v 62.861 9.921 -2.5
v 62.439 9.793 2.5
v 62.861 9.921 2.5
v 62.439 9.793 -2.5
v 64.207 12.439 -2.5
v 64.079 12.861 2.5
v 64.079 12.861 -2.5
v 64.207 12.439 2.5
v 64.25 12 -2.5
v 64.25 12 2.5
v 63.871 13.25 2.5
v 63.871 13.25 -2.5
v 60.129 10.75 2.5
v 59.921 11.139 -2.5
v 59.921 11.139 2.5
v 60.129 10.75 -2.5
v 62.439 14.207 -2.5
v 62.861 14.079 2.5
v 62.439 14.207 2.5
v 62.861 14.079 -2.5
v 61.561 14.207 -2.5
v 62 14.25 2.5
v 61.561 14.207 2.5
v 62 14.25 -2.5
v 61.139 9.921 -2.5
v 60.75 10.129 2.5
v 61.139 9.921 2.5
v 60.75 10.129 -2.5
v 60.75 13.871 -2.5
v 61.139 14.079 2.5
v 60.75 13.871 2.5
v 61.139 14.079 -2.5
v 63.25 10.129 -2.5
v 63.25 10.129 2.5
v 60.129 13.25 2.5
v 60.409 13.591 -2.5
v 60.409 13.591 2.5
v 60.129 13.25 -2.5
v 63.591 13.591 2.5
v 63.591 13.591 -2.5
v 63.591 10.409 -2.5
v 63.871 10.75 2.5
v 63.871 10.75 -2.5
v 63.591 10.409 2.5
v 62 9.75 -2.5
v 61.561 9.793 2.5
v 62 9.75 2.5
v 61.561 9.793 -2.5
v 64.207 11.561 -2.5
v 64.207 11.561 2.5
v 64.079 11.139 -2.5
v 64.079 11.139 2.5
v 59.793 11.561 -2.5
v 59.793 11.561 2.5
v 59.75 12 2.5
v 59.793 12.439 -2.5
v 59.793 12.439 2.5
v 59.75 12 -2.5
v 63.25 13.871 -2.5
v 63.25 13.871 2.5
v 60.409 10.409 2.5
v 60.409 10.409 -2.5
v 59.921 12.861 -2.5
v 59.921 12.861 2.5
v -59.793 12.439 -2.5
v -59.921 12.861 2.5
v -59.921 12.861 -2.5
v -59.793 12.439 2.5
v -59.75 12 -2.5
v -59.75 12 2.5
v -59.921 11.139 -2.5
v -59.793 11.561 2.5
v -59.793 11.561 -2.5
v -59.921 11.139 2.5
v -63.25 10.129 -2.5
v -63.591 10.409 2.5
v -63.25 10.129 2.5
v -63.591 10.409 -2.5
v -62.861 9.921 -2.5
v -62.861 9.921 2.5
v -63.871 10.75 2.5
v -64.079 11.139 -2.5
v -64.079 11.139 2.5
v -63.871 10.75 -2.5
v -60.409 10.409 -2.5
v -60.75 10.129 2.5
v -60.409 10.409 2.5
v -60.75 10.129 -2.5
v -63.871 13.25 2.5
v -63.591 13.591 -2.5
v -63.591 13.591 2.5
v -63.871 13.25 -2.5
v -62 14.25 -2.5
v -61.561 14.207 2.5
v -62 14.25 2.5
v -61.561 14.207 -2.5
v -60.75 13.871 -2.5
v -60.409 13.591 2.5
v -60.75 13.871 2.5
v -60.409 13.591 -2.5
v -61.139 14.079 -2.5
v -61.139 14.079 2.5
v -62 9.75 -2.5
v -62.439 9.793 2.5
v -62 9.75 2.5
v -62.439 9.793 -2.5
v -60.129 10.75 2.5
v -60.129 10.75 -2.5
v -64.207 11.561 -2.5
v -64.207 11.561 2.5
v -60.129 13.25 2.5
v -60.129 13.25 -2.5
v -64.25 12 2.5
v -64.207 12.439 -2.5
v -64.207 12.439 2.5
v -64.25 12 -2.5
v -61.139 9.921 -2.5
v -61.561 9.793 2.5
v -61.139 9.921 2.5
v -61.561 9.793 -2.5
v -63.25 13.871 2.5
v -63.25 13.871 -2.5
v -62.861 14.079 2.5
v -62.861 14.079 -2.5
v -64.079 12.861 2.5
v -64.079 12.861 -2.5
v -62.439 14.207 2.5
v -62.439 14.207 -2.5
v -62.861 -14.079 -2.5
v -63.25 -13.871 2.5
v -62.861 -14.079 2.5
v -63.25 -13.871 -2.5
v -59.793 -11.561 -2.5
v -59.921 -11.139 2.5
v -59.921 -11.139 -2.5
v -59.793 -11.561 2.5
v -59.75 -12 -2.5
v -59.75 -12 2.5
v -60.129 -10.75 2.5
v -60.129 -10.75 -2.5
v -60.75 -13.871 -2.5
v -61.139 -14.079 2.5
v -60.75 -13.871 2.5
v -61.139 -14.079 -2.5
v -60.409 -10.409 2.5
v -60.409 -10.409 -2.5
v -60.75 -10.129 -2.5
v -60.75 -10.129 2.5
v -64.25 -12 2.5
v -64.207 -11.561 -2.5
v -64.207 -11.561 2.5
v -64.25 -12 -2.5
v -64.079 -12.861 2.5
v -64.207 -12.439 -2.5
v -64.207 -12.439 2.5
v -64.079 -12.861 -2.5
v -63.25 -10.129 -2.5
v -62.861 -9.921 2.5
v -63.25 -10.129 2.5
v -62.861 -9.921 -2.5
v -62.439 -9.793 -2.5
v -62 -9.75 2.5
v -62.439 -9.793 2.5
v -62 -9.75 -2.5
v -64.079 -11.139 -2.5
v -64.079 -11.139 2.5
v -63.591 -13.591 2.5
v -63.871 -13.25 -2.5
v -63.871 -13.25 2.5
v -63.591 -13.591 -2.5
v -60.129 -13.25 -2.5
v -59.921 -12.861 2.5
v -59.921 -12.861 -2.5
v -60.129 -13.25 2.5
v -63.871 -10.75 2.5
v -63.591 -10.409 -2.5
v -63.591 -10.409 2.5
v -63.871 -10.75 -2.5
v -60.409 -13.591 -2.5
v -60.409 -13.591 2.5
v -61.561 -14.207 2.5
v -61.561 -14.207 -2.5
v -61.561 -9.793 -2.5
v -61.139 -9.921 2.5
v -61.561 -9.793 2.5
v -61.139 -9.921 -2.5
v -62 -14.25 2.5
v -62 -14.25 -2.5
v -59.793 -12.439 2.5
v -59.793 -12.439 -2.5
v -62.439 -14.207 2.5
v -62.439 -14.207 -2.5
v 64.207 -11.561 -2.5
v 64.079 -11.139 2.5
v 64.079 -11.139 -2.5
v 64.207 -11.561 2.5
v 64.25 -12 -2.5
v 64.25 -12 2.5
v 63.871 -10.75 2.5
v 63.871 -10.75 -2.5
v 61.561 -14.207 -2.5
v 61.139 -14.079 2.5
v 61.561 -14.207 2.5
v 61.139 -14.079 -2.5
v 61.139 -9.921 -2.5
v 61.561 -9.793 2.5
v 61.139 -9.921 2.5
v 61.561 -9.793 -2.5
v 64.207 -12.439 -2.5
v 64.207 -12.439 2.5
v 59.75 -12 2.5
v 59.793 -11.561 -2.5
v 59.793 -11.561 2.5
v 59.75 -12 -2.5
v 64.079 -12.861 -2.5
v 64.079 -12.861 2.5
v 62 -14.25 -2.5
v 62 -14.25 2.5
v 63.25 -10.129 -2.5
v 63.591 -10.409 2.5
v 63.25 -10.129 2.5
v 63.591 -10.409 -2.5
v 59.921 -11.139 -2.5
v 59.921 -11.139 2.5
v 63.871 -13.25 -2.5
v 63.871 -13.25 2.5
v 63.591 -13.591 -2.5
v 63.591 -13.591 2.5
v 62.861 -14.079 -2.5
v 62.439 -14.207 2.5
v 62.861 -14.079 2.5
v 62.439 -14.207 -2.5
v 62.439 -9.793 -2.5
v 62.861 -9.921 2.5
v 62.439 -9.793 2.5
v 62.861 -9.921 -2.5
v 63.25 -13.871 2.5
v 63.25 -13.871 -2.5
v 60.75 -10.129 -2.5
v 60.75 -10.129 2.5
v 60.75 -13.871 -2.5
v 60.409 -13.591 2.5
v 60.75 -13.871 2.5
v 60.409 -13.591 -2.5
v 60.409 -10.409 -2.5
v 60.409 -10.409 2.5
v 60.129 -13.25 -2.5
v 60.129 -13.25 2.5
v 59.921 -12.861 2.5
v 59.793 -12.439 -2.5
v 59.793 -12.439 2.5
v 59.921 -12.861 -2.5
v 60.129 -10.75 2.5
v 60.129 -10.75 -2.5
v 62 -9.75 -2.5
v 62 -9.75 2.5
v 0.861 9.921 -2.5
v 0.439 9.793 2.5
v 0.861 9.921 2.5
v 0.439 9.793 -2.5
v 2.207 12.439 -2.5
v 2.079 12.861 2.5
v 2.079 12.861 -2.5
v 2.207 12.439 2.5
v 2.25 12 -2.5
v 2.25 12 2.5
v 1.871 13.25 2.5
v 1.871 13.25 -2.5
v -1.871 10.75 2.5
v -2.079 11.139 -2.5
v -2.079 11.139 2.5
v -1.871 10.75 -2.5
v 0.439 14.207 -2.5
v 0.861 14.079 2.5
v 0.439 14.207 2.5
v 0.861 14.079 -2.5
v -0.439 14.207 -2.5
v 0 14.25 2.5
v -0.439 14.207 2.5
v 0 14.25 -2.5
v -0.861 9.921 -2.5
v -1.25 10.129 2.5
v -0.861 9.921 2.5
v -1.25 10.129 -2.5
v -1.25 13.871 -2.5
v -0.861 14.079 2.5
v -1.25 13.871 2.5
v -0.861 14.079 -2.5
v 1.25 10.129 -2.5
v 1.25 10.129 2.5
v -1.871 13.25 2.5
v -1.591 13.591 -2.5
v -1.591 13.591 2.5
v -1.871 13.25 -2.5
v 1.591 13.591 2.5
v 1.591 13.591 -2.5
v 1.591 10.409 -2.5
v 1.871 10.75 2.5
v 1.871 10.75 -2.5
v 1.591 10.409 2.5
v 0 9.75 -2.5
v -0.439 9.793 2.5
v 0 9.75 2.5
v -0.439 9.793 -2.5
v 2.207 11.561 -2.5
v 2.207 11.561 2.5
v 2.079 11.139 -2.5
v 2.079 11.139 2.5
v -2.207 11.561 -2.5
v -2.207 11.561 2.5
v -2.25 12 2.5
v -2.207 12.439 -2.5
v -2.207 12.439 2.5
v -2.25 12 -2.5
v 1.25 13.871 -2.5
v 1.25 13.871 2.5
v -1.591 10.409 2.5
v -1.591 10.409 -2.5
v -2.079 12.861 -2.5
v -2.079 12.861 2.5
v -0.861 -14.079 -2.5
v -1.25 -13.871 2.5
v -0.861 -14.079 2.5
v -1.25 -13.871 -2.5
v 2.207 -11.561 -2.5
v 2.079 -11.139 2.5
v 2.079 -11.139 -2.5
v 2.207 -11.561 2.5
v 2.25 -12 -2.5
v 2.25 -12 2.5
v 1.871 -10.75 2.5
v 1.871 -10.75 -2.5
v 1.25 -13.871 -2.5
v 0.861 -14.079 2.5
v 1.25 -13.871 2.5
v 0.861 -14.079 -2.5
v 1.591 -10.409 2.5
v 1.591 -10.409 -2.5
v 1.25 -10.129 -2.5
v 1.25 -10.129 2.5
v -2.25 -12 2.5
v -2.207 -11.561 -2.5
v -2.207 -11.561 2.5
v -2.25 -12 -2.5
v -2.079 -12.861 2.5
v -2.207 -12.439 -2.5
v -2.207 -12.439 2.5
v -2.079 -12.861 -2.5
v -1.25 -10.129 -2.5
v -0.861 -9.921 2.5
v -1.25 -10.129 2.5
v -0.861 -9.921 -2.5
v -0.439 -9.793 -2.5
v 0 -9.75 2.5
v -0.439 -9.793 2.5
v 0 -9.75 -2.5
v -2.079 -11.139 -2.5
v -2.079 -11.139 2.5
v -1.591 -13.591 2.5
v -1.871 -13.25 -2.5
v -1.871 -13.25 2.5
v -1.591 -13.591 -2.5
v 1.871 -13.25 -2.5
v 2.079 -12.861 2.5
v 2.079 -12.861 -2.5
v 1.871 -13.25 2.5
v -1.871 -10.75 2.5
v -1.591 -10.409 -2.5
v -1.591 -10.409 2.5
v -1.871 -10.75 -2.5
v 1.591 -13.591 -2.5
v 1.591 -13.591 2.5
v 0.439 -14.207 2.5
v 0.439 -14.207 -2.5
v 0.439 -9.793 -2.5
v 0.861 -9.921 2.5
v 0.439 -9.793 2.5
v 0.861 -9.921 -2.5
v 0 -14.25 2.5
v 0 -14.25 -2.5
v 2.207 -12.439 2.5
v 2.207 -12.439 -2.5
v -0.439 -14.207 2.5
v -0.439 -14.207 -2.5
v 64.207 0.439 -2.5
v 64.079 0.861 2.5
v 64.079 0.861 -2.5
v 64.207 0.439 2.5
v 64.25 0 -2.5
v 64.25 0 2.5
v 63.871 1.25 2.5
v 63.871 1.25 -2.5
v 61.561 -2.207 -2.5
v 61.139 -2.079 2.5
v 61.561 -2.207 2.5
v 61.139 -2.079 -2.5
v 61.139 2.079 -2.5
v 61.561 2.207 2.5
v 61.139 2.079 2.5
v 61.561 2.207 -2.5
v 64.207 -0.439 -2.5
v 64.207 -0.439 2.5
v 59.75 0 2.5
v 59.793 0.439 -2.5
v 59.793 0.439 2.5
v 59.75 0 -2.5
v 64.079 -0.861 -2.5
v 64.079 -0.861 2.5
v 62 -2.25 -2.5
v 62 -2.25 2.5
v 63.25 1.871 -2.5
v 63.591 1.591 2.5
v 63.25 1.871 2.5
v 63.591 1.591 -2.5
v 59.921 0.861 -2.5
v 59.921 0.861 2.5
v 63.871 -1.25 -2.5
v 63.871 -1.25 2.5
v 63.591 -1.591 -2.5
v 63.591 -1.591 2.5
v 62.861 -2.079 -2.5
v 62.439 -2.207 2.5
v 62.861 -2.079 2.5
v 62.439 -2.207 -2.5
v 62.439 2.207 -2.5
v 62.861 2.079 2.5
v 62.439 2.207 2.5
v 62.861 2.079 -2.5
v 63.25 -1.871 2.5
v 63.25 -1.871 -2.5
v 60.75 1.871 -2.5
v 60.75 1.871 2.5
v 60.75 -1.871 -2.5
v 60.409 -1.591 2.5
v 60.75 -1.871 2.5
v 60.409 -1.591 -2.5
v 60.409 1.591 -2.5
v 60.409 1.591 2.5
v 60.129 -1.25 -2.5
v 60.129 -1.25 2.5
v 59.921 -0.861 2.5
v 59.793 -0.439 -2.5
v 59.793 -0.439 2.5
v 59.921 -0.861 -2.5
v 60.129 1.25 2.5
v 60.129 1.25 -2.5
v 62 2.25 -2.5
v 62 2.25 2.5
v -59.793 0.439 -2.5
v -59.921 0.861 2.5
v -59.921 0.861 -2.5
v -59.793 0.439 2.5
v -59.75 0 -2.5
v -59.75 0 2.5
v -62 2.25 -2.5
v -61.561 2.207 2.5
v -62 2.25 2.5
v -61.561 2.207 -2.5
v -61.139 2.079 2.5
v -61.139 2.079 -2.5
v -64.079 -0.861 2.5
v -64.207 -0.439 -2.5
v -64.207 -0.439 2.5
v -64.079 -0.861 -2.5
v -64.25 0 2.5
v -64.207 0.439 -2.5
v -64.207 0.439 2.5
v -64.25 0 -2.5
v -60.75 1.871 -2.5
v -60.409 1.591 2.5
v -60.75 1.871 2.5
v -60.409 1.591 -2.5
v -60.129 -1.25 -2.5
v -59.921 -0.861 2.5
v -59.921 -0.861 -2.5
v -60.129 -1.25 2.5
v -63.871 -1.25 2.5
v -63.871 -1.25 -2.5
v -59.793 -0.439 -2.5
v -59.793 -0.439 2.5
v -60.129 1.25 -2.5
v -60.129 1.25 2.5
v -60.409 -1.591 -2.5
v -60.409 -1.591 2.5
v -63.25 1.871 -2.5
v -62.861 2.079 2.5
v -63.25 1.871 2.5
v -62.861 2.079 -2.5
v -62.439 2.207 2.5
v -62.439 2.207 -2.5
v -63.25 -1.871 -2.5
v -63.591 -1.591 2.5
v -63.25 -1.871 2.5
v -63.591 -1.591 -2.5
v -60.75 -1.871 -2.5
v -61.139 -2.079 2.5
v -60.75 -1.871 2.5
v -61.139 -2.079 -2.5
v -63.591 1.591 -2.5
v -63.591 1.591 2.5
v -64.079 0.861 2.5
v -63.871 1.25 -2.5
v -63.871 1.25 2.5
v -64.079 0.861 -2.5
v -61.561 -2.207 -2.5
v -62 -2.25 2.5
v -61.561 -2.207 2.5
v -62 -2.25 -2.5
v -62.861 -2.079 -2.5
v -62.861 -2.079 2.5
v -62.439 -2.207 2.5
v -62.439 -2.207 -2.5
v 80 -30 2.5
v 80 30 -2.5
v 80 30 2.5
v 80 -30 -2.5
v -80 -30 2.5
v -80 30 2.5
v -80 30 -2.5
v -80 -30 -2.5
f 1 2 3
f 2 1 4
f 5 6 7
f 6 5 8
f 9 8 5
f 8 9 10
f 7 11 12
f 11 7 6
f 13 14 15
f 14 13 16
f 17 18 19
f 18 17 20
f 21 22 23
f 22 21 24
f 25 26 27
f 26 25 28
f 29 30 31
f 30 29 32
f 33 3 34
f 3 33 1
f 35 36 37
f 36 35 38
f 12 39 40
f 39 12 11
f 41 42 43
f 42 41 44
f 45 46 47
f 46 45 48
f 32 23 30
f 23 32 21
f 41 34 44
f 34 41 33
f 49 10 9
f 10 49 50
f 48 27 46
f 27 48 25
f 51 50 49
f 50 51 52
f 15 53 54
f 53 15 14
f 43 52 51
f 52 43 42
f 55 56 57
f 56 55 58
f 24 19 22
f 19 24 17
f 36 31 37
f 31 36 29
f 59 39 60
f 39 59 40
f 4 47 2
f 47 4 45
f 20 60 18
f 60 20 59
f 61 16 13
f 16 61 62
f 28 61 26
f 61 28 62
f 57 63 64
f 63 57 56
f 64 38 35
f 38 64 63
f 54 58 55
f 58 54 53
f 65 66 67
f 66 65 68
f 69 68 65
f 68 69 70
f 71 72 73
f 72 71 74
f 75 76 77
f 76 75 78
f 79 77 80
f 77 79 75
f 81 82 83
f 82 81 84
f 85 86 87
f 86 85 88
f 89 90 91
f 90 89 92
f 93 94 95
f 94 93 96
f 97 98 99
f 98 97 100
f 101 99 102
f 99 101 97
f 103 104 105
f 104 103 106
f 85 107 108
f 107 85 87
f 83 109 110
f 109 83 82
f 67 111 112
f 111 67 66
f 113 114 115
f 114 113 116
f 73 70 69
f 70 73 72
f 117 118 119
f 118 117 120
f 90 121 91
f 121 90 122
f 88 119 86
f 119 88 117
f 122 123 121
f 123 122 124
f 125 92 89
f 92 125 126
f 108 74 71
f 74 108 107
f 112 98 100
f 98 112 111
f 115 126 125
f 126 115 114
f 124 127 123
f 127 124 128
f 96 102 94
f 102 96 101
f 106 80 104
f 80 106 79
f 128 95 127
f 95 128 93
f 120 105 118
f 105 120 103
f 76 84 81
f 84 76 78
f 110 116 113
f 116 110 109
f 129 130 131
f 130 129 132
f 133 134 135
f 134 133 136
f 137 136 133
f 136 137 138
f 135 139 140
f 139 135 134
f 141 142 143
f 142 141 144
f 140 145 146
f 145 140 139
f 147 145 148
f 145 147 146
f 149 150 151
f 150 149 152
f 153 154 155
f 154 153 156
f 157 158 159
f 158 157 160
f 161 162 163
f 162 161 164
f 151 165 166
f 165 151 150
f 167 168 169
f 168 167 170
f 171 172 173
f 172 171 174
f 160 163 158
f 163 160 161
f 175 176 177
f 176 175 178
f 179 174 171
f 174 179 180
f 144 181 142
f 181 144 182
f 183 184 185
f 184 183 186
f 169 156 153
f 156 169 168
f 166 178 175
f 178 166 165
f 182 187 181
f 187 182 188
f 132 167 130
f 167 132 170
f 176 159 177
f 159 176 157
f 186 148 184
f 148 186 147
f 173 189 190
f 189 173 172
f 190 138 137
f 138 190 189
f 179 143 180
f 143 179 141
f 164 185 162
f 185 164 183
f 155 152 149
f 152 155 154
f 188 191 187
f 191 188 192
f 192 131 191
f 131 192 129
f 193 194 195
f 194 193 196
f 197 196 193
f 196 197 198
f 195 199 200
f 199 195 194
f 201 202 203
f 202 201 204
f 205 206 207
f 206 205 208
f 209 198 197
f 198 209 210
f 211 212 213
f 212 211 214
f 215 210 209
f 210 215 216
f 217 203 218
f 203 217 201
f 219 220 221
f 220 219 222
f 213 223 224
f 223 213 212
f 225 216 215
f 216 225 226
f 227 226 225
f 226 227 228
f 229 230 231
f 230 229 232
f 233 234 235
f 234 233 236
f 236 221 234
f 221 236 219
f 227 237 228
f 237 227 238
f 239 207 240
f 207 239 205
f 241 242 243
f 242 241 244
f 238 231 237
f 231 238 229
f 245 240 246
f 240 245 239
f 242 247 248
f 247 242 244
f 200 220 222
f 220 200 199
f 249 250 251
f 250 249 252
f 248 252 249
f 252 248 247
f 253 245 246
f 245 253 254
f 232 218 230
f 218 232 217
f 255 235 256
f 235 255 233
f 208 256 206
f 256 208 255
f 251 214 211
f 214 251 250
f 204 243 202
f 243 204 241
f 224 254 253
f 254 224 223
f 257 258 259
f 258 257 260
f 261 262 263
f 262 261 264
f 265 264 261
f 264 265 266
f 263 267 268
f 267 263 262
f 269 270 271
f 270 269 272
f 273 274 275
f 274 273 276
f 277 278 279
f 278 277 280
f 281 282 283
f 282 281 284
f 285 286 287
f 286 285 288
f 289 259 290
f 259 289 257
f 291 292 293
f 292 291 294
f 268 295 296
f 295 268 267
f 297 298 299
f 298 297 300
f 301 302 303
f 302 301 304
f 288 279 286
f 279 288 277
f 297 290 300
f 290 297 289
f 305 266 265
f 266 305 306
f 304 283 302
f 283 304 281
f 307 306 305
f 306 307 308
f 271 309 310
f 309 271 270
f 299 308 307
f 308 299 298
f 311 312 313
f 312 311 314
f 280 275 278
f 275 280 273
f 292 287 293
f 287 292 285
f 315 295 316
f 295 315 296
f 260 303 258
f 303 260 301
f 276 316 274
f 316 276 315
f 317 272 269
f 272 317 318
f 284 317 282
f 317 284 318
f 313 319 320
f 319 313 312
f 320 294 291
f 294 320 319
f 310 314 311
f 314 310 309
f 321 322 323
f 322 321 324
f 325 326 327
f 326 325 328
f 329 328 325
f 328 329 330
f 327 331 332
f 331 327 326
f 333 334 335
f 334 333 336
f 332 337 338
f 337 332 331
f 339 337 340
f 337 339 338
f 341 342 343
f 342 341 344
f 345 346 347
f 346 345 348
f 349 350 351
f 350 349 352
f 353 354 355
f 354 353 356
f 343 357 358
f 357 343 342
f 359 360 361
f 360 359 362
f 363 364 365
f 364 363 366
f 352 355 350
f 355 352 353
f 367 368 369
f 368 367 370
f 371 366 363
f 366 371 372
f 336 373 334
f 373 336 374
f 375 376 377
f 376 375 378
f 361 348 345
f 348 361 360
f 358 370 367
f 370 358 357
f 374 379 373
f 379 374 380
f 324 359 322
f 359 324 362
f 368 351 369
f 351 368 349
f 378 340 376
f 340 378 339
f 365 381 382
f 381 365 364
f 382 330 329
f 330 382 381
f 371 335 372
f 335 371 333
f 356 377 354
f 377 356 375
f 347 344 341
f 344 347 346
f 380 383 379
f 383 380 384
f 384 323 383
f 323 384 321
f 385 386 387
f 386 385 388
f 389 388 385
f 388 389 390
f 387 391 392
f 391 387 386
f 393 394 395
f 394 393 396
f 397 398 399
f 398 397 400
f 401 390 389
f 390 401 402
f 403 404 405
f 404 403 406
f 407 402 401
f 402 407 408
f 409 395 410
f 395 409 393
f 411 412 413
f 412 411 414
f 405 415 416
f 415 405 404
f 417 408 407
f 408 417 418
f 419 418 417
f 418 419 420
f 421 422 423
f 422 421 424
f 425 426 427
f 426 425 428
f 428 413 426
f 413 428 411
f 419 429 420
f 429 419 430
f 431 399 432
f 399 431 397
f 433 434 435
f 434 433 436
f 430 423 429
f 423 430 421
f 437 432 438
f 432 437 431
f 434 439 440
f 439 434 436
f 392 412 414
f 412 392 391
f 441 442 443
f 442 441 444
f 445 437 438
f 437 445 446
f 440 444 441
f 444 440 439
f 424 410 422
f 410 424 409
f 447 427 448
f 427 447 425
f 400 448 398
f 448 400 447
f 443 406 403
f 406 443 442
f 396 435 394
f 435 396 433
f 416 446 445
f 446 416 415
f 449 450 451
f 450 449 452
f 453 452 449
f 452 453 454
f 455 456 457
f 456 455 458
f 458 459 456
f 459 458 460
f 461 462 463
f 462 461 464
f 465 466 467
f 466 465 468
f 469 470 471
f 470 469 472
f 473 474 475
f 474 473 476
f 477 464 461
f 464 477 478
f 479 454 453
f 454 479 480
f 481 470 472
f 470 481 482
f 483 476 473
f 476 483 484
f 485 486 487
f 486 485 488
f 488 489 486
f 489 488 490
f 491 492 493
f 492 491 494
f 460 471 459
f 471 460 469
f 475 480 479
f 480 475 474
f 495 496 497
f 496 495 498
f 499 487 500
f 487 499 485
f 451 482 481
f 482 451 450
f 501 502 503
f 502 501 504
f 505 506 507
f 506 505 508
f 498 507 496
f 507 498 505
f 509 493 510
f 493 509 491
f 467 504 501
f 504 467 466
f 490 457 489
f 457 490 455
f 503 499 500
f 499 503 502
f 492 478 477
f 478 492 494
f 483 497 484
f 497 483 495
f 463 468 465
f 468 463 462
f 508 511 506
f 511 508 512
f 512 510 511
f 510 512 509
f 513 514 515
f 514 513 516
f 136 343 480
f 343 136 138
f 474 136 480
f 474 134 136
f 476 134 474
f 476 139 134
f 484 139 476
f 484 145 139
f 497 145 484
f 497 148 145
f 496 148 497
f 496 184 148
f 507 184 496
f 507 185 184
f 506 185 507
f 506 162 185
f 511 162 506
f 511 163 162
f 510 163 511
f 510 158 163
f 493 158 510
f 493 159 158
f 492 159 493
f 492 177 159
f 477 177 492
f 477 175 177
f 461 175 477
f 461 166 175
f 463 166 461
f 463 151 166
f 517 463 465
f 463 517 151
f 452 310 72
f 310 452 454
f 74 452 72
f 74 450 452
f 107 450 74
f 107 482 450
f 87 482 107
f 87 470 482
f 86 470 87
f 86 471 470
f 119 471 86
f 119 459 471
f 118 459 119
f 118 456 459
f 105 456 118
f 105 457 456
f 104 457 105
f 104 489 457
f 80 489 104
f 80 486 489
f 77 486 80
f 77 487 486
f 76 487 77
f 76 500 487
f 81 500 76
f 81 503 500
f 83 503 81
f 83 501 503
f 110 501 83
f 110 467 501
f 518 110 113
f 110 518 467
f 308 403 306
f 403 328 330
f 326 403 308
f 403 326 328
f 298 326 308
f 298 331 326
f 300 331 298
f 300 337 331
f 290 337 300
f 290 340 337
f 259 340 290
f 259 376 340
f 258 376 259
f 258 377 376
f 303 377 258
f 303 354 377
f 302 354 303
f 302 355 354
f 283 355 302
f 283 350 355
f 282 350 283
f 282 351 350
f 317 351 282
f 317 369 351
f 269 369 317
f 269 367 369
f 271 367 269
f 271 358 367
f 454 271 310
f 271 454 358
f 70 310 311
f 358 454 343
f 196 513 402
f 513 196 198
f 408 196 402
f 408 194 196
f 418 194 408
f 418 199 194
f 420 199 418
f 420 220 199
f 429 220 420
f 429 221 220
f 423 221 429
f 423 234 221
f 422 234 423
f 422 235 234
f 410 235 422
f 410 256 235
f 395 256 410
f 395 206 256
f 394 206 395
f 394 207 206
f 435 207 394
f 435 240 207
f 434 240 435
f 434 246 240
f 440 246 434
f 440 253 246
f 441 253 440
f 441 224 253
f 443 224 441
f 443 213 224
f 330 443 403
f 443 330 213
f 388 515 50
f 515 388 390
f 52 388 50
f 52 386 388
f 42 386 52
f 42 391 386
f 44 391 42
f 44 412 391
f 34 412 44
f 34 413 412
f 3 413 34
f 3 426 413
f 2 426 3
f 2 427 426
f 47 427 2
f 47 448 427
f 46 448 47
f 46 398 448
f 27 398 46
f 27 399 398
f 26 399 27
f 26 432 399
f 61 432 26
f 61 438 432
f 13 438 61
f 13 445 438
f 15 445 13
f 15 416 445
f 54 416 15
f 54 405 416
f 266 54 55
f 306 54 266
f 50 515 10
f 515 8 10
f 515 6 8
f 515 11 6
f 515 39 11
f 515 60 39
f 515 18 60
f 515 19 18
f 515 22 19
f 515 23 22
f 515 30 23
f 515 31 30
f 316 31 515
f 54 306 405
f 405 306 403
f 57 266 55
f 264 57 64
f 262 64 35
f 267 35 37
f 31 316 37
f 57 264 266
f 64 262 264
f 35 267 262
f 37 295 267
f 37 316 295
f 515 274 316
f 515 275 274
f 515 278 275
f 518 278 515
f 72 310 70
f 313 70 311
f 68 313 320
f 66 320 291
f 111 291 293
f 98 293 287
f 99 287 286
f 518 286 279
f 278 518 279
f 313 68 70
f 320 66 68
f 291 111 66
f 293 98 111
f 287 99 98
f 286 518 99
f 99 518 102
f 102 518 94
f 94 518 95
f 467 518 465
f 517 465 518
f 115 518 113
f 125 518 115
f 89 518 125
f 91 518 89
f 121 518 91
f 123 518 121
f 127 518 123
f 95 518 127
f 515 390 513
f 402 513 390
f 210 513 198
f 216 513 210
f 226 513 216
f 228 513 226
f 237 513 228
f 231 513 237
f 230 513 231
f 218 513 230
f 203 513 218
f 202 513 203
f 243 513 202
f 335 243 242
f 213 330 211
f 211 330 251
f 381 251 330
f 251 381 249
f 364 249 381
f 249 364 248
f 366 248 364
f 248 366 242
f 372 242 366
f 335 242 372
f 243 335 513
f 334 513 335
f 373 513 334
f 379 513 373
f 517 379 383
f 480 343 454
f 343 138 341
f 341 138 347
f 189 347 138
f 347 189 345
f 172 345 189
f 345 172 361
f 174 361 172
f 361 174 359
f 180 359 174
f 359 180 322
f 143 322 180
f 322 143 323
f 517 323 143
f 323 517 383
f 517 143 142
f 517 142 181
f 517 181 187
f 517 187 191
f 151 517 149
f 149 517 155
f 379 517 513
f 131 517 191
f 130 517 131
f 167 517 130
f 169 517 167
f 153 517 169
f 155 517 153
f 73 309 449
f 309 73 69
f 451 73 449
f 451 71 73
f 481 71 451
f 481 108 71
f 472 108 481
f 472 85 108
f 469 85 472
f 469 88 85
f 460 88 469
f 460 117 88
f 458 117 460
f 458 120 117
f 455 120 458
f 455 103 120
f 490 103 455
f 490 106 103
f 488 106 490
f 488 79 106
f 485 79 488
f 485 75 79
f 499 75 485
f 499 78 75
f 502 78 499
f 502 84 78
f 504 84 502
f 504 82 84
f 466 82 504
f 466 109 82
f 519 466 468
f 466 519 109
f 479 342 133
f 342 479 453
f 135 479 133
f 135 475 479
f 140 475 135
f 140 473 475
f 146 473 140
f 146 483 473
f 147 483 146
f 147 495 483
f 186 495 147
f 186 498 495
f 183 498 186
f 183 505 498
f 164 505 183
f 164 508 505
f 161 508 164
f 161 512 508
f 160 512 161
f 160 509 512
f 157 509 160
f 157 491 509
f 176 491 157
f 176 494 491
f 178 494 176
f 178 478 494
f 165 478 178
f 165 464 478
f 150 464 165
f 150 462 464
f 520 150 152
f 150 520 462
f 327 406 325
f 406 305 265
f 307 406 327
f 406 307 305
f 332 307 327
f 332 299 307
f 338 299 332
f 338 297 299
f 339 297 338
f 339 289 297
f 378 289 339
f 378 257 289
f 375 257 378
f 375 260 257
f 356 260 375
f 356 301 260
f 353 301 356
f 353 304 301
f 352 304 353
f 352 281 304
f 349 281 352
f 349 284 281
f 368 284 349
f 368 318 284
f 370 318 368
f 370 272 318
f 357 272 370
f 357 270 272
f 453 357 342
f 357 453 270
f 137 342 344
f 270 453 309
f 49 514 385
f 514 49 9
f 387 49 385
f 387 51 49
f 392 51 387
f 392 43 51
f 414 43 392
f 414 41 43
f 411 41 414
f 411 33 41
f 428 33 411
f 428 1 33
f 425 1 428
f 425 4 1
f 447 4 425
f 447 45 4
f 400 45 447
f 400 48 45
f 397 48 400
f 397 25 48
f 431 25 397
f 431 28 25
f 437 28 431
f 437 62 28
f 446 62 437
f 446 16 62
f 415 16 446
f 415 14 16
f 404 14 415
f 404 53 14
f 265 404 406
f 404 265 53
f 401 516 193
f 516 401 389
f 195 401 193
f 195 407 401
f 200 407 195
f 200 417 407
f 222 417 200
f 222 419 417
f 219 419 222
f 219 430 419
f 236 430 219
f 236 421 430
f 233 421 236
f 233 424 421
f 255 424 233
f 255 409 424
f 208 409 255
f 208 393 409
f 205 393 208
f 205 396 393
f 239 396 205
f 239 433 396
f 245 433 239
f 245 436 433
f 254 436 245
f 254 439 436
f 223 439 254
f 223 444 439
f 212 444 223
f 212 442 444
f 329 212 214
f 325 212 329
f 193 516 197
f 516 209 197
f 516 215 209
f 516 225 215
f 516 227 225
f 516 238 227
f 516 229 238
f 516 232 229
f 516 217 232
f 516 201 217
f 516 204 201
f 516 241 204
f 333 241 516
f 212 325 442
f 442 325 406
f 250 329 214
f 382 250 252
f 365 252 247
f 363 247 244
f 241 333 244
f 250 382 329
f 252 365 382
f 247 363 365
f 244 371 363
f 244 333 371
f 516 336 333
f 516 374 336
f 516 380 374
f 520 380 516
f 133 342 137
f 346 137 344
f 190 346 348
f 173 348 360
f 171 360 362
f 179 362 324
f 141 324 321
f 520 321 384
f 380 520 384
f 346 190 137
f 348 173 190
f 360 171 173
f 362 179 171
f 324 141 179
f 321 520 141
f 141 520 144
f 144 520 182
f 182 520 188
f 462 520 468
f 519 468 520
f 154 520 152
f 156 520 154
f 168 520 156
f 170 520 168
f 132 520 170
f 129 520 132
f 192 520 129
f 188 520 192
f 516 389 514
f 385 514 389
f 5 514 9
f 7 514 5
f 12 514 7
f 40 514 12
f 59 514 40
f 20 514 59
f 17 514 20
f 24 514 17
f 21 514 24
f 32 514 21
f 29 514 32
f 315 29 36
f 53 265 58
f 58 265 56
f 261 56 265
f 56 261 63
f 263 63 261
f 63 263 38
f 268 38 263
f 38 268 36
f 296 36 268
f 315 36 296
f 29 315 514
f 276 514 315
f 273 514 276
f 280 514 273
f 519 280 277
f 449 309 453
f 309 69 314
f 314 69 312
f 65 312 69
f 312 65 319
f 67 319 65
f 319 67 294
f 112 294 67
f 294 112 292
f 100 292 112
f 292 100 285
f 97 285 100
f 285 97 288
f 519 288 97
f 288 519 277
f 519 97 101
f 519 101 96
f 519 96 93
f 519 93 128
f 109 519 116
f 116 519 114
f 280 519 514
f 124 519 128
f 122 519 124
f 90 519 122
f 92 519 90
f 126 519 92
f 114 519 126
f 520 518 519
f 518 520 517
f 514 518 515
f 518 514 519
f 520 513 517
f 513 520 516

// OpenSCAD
$fn = 32;

// ----------------------------------------------------------------------
// Corner plate 160 x 60 x 5
// 8 holes, centres taken from the edge offset
// ----------------------------------------------------------------------

// --- parameters (mm) ---
plate = [160, 60, 5];  // overall size (x, y, z)
holes = 8;             // number of holes the drawing asks for
hole_d = 4.5;          // hole diameter
edge = 18;             // hole centre offset from the plate edge

// --- derived feature positions (mm) ---
corner_x = plate[0] / 2 - edge;  // = 62   corner hole X
corner_y = plate[1] / 2 - edge;  // = 12   corner hole Y
feature_centers = [
  [corner_x, corner_y],
  [-corner_x, corner_y],
  [-corner_x, -corner_y],
  [corner_x, -corner_y],
  [0, corner_y],
  [0, -corner_y],
  [corner_x, 0],
  [-corner_x, 0]
];   // hole centres the loop below drills

// plate outline, every hole drilled through with the same cutters
difference() {
  cube(plate, center = true);
  for (centre = feature_centers)
    translate([centre[0], centre[1], 0])
      cylinder(d = hole_d, h = plate[2] + 2, center = true);
}
